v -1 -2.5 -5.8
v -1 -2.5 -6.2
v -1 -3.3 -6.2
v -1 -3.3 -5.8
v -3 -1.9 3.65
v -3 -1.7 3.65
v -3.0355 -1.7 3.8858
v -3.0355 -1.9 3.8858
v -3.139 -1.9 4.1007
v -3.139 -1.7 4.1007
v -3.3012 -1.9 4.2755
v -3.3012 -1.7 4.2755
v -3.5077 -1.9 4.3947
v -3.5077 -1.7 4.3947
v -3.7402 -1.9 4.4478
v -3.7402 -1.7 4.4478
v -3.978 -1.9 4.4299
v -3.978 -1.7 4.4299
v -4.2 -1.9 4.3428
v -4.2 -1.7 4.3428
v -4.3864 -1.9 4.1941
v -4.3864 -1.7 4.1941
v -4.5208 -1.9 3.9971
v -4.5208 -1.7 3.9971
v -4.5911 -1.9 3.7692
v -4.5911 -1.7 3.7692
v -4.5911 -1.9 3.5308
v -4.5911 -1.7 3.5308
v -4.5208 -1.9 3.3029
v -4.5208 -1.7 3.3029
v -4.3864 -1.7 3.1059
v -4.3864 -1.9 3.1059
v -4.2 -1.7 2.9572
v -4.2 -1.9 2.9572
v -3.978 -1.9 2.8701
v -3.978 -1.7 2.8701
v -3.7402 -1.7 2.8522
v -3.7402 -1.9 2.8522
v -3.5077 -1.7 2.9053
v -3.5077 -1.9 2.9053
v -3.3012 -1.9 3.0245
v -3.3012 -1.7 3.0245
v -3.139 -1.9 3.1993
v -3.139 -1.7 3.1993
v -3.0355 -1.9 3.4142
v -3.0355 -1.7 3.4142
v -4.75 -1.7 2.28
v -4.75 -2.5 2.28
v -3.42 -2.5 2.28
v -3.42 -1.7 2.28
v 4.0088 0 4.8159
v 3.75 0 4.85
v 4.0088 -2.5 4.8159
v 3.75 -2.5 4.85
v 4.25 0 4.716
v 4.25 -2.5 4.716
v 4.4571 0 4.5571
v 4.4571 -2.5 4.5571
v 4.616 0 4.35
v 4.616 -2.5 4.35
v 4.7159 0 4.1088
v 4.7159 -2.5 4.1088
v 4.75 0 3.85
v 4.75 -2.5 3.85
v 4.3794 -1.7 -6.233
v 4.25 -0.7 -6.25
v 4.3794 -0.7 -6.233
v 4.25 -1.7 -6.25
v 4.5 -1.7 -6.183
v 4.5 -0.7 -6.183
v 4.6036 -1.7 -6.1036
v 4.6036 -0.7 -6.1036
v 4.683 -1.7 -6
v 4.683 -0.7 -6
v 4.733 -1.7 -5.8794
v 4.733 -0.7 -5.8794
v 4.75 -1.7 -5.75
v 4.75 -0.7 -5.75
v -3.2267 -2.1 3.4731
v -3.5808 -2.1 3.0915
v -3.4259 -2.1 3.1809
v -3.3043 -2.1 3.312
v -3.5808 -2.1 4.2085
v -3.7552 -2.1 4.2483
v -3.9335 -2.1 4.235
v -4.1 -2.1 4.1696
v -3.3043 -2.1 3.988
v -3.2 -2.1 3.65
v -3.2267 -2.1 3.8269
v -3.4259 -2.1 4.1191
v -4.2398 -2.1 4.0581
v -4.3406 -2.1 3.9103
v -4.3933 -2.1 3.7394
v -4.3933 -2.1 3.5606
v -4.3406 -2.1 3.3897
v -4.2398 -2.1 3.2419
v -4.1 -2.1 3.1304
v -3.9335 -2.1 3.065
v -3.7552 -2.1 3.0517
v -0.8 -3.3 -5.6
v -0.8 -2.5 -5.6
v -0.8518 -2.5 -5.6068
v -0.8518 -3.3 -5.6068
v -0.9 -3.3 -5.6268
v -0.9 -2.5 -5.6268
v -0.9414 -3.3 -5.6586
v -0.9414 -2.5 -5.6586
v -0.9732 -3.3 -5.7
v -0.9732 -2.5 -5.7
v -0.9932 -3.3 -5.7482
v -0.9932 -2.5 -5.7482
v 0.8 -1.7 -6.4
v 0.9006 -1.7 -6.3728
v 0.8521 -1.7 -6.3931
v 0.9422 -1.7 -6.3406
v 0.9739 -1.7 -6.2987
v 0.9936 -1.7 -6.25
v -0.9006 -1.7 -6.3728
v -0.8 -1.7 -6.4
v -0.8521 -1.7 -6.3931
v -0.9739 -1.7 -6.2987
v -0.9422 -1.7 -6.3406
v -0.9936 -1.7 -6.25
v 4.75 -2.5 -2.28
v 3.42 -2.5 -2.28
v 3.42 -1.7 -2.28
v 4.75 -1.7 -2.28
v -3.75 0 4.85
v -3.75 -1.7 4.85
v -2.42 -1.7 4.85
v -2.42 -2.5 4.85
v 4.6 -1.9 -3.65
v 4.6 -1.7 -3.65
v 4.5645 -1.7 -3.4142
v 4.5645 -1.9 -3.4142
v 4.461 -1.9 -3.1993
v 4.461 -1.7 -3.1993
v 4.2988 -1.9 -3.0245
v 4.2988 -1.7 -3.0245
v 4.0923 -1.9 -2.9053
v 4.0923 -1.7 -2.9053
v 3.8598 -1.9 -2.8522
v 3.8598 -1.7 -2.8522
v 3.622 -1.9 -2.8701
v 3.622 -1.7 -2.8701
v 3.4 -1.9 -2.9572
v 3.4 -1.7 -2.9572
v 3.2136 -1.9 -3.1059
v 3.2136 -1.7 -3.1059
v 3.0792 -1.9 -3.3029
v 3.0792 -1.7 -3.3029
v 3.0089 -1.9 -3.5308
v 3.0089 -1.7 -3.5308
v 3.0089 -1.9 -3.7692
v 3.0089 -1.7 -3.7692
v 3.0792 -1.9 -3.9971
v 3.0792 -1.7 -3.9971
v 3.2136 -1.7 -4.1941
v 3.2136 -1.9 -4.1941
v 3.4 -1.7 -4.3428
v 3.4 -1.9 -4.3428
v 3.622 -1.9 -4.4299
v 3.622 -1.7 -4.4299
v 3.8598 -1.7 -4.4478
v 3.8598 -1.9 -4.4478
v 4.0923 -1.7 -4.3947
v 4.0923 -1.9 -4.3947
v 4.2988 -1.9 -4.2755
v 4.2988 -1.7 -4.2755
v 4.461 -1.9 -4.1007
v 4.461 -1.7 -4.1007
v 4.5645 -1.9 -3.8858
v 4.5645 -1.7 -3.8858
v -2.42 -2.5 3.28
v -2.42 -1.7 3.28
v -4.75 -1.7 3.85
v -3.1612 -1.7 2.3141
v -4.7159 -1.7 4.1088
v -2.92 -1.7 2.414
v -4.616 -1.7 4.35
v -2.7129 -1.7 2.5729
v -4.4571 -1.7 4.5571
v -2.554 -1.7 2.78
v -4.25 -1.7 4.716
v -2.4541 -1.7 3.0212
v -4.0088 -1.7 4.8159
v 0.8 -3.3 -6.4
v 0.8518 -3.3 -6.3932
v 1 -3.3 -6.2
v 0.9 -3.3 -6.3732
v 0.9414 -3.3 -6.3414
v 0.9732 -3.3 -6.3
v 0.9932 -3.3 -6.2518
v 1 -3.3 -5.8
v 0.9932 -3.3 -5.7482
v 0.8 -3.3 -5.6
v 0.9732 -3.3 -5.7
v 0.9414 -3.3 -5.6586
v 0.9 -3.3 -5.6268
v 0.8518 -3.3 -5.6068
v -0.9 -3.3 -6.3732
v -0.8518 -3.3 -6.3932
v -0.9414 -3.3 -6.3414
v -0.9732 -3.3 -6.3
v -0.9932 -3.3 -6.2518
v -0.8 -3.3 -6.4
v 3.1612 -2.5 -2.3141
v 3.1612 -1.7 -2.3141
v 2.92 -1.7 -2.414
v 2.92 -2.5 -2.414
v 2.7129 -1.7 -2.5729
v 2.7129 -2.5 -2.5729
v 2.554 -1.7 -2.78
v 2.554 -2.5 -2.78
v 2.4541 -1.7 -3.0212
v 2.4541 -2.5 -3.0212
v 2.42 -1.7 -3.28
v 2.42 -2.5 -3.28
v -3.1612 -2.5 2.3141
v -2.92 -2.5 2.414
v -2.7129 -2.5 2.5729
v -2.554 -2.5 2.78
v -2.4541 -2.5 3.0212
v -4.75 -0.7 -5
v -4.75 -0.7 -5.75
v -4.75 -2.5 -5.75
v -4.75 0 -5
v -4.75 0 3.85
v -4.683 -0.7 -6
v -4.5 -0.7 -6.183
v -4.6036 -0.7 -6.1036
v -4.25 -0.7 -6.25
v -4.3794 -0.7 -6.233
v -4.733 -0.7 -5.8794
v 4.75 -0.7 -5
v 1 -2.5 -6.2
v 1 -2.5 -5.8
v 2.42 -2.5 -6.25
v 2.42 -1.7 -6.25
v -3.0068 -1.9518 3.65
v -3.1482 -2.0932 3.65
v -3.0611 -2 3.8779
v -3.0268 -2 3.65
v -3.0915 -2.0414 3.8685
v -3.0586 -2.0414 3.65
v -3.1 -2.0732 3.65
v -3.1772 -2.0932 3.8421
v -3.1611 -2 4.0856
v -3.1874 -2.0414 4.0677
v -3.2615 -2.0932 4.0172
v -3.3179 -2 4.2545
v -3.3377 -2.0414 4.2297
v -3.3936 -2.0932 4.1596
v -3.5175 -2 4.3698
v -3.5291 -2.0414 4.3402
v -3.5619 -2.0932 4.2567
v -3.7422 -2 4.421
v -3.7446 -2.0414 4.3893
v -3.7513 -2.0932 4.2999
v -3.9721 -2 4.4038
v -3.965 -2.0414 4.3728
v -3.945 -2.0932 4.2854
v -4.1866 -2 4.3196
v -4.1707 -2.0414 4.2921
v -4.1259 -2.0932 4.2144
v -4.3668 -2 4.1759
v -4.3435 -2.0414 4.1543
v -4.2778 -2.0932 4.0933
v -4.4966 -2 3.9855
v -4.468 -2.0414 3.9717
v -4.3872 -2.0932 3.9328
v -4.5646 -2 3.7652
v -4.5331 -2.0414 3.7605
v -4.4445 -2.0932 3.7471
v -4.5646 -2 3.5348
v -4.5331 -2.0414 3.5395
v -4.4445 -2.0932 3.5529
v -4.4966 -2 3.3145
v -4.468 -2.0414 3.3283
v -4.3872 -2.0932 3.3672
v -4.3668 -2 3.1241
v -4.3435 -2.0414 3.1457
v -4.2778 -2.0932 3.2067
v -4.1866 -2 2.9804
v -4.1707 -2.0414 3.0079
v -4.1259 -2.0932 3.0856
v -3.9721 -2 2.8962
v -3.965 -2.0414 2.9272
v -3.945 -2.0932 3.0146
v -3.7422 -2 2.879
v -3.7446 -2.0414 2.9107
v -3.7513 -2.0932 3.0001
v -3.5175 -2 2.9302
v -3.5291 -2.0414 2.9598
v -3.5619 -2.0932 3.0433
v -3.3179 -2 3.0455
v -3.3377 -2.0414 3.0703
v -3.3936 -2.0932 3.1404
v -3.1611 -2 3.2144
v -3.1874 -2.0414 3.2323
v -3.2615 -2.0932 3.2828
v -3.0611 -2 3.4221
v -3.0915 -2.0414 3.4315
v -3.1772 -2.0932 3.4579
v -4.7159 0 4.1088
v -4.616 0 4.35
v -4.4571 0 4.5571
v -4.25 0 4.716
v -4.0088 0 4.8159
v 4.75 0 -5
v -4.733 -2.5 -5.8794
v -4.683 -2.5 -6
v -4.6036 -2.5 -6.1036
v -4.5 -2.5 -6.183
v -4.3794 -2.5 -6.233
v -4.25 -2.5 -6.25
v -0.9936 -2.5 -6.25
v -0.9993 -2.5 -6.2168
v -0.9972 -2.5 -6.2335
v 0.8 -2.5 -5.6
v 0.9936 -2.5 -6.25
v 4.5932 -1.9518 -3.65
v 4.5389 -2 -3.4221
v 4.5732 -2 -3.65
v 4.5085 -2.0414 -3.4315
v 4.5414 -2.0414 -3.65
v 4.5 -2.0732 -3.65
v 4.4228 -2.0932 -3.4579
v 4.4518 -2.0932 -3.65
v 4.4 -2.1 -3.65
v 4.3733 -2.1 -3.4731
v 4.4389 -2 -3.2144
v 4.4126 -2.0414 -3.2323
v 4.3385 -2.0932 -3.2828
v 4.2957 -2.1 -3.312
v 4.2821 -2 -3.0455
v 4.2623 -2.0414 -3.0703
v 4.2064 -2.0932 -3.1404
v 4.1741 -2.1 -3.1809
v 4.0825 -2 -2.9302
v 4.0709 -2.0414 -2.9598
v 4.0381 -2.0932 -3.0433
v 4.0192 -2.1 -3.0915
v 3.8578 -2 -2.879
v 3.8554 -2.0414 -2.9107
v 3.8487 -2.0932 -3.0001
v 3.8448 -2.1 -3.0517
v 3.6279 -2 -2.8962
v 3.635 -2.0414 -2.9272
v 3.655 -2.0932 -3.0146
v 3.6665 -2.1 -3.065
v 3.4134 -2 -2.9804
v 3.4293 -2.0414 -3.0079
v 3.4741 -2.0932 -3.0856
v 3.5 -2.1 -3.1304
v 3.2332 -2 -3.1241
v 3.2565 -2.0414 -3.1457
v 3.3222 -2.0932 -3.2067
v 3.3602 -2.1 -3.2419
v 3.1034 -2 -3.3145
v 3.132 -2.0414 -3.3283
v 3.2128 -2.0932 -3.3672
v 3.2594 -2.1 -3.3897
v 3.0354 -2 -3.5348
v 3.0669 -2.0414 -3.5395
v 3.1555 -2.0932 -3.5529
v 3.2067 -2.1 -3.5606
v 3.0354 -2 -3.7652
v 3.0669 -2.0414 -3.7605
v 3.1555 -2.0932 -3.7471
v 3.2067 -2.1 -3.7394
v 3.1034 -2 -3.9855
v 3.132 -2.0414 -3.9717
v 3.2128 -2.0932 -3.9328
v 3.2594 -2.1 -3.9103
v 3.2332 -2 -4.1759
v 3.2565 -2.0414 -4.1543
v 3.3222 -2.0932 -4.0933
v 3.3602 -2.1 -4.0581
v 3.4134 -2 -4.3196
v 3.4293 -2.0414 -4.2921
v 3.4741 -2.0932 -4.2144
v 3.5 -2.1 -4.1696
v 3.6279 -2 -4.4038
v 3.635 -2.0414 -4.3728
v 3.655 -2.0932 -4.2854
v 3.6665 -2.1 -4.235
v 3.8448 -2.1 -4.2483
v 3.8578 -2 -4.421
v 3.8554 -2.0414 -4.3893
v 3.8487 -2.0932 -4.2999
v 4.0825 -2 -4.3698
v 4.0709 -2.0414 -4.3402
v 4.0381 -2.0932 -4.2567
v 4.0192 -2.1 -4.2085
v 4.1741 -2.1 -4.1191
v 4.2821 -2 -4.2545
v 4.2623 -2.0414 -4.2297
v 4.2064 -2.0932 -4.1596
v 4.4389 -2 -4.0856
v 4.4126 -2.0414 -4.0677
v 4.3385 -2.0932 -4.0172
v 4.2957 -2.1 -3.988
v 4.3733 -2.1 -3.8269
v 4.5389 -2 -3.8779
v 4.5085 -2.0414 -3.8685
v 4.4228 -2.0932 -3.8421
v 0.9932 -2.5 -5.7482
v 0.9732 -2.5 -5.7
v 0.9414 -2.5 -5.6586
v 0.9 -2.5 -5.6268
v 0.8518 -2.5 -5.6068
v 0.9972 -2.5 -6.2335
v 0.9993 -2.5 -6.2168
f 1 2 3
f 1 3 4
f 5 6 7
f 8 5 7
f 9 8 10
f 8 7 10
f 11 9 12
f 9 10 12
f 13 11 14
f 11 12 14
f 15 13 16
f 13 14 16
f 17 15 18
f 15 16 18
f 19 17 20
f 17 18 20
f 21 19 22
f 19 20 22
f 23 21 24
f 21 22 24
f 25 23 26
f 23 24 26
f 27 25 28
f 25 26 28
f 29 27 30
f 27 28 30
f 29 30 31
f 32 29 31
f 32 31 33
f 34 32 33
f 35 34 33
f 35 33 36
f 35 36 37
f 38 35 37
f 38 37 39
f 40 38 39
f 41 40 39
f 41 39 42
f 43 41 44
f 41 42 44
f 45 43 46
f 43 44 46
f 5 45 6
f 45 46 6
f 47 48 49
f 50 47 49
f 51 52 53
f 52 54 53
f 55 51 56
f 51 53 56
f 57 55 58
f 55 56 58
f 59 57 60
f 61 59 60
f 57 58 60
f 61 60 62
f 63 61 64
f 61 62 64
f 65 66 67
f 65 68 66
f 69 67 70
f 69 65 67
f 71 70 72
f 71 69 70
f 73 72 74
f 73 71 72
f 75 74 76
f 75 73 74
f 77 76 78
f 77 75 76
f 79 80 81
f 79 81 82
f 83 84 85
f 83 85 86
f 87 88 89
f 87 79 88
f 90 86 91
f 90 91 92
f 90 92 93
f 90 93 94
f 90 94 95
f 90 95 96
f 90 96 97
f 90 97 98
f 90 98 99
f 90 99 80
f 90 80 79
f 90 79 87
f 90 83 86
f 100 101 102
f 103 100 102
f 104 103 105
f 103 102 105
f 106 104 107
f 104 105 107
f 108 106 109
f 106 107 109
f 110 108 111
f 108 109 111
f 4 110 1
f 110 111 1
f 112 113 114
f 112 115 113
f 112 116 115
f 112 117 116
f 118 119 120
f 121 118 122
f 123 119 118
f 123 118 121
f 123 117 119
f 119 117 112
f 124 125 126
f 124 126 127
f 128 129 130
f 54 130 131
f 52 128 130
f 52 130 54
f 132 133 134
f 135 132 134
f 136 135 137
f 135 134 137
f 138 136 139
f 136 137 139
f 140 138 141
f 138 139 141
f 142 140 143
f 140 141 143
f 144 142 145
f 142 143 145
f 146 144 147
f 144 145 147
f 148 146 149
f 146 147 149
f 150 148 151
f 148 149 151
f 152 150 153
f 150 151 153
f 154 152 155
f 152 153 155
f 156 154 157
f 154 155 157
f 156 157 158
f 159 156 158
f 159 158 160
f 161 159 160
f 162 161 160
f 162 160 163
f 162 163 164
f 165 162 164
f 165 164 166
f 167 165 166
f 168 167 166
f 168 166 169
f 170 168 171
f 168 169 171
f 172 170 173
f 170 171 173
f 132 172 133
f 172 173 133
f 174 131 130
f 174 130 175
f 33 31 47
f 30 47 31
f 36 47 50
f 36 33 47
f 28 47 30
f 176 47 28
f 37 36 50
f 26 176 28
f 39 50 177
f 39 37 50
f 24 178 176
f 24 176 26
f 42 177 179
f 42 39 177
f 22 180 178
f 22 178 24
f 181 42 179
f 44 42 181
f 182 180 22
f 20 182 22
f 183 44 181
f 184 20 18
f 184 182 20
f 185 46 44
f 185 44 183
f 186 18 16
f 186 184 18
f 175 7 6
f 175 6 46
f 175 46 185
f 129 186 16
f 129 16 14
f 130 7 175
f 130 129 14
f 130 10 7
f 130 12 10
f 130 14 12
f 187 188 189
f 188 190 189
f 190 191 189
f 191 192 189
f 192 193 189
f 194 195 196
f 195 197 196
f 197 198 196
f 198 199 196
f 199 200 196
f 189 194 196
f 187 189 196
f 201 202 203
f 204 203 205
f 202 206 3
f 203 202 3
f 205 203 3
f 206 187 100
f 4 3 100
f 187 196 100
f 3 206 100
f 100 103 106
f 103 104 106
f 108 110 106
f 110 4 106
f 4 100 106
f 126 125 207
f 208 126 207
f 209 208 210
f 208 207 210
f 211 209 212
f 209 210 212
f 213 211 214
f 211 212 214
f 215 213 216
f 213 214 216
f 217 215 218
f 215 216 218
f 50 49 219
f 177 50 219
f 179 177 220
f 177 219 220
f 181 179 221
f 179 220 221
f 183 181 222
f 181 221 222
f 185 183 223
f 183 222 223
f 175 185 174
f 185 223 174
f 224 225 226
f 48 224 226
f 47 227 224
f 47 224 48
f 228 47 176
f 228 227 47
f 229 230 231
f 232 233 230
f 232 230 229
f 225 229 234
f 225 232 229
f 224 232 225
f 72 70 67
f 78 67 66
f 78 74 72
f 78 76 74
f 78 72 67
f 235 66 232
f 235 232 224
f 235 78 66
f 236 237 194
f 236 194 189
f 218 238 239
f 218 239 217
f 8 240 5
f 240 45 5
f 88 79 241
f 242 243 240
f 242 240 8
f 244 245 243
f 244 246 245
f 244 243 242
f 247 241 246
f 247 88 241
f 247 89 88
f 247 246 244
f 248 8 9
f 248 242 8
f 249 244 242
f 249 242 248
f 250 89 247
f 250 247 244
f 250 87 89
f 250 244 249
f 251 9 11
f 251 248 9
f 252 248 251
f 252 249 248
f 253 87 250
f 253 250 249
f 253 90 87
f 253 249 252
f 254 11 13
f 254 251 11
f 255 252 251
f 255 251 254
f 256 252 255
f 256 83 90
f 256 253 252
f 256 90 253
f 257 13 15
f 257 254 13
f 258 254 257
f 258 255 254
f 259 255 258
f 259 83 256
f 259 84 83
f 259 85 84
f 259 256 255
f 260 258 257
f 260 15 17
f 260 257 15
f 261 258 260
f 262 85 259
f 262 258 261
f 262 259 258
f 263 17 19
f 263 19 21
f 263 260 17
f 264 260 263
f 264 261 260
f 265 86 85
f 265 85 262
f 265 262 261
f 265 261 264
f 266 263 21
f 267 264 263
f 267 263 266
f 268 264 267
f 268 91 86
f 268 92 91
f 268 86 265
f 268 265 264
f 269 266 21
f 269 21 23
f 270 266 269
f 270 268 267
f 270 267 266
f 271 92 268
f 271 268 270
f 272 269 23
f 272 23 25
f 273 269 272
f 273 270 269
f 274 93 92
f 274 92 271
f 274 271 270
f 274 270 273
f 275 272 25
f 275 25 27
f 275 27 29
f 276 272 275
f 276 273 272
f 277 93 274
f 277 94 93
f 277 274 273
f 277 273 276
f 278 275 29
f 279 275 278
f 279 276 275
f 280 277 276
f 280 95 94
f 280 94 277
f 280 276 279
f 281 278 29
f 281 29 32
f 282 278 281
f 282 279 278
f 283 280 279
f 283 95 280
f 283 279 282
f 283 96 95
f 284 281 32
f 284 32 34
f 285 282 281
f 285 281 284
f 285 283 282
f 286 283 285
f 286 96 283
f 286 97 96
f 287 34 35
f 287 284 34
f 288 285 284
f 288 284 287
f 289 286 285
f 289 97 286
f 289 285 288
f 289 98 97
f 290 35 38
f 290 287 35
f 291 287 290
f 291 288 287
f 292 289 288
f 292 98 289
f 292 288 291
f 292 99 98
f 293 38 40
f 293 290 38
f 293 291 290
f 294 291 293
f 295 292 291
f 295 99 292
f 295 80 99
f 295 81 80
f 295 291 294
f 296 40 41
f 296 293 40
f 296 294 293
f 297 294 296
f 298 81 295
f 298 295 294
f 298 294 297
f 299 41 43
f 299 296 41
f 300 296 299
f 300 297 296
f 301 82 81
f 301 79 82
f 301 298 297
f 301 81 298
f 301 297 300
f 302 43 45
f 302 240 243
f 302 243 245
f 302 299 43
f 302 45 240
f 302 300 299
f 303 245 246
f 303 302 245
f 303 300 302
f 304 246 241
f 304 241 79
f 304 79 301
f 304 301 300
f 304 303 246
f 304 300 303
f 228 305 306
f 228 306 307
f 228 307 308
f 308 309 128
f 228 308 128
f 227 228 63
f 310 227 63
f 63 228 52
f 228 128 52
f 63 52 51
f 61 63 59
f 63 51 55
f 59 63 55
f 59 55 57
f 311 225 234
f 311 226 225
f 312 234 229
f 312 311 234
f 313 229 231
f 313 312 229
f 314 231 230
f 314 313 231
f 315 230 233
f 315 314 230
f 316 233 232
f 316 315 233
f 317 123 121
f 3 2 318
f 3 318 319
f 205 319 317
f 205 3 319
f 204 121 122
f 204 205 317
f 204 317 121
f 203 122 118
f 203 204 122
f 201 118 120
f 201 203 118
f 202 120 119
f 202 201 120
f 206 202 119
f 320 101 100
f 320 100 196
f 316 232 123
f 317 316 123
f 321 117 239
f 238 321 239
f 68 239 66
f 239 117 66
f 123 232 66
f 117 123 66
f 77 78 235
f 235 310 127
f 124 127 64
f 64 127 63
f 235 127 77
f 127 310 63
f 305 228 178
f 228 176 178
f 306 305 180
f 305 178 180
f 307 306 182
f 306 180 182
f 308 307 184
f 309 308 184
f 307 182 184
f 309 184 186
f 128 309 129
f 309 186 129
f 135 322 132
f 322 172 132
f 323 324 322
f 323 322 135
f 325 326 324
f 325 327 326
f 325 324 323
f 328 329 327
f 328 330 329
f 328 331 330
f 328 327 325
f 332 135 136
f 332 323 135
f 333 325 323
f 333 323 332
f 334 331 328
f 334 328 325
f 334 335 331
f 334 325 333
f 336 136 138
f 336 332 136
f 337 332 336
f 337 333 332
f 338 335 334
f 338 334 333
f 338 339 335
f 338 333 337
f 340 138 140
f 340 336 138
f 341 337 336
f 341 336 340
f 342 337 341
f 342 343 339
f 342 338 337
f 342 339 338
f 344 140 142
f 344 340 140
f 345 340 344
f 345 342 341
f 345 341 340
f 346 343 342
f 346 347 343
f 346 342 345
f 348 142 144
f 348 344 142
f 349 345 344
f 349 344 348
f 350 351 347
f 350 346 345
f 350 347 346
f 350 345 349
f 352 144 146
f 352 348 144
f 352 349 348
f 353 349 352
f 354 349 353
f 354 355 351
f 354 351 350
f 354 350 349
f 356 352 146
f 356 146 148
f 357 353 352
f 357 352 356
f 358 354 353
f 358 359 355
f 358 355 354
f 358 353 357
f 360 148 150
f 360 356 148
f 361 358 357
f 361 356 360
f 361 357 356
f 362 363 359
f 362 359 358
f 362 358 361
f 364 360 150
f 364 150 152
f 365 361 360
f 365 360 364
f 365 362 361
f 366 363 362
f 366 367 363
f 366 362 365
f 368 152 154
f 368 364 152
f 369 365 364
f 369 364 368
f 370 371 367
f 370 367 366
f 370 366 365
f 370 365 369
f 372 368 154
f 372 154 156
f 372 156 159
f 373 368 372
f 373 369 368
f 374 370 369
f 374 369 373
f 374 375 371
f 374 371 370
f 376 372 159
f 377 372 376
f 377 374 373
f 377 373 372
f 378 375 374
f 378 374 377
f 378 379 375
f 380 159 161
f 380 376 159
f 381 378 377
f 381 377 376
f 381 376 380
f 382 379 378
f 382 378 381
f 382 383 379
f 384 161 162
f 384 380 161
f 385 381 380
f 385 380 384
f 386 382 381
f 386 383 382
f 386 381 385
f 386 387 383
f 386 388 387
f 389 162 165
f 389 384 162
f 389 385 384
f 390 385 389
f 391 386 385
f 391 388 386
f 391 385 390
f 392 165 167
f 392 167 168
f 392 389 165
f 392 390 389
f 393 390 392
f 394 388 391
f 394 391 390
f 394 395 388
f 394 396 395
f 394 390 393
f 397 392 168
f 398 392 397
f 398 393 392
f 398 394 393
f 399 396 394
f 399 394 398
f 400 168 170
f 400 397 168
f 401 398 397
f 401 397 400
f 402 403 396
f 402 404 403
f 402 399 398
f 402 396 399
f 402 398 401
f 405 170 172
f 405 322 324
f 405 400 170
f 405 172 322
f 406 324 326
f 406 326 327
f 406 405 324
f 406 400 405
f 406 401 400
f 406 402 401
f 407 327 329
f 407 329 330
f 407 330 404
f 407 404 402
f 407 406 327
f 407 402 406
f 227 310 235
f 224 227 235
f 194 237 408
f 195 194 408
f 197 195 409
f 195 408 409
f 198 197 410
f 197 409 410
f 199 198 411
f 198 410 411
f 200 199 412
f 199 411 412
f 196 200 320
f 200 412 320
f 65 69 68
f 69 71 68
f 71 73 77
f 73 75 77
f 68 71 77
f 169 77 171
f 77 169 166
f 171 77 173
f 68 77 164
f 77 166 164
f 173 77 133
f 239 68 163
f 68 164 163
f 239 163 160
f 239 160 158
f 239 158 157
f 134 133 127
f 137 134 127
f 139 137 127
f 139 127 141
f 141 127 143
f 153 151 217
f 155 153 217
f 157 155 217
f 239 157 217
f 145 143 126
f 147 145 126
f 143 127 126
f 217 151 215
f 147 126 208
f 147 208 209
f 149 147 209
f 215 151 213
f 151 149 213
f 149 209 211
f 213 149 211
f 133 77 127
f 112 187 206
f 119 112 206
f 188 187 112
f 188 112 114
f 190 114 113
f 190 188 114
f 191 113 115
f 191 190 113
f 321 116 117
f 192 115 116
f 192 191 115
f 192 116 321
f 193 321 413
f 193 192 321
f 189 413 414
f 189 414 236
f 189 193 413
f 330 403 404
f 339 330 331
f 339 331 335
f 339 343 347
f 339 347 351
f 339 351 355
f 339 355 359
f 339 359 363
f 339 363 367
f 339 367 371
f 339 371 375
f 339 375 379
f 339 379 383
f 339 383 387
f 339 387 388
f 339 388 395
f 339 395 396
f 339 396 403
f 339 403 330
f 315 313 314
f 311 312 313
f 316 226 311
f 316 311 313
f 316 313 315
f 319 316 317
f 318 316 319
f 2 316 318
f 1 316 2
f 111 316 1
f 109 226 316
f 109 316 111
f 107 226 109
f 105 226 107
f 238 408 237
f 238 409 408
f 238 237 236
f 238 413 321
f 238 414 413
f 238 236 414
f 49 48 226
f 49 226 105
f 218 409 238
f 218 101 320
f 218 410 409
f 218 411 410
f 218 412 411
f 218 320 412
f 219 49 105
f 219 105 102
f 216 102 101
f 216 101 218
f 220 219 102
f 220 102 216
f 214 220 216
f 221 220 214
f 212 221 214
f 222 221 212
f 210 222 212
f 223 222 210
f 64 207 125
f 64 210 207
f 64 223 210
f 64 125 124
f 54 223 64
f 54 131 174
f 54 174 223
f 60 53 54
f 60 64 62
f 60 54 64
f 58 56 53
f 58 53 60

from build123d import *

# Parameters (mm, degrees)
SKETCH_W          = 9.5
SKETCH_H          = 11.1
PAD_DEPTH         = 2.5
POCKET_DEPTH      = 0.8
SKETCH002_R       = 0.8
PAD001_DEPTH      = 0.4
SKETCH003_R       = 0.8
PAD002_DEPTH      = 0.4
FILLET_R          = 0.2
SKETCH004_W       = 1.25
SKETCH004_H       = 0.7
POCKET001_DEPTH   = 9.5
FILLET001_R       = 1
FILLET002_R       = 0.5
PAD003_DEPTH      = 0.8
PAD003_DEPTH_BACK = 0.8


with BuildPart() as part:
    # Sketch → Pad (new body)
    with BuildSketch(Plane.XZ):
        with Locations((0, -0.7)):
            Rectangle(SKETCH_W, SKETCH_H)
    extrude(amount=PAD_DEPTH)

    # Sketch001 (on Face6 of Pad) → Pocket (cut)
    with BuildSketch(Plane.XZ.offset(2.5)):
        with BuildLine():
            Line((3.42, -2.28), (4.75, -2.28))
            Line((4.75, -2.28), (4.75, -6.25))
            Line((4.75, -6.25), (2.42, -6.25))
            Line((2.42, -6.25), (2.42, -3.28))
            ThreePointArc((3.42, -2.28), (2.712893, -2.572893), (2.42, -3.28))
        make_face()
        with BuildLine():
            Line((-4.75, 4.85), (-4.75, 2.28))
            Line((-4.75, 2.28), (-3.42, 2.28))
            ThreePointArc((-3.42, 2.28), (-2.712893, 2.572893), (-2.42, 3.28))
            Line((-2.42, 4.85), (-2.42, 3.28))
            Line((-4.75, 4.85), (-2.42, 4.85))
        make_face()
    extrude(amount=-POCKET_DEPTH, mode=Mode.SUBTRACT)

    # Sketch002 (on Face9 of Pocket) → Pad001 (join)
    with BuildSketch(Plane.XZ.offset(1.7)):
        with Locations((3.8, -3.65)):
            Circle(SKETCH002_R)
    extrude(amount=PAD001_DEPTH)

    # Sketch003 (on Face6 of Pad001) → Pad002 (join)
    with BuildSketch(Plane.XZ.offset(1.7)):
        with Locations((-3.8, 3.65)):
            Circle(SKETCH003_R)
    extrude(amount=PAD002_DEPTH)

    # Fillet
    fillet_edges = [part.edges().sort_by_distance(p)[0] for p in [
        (-4.6, -2.1, 3.65),
        (3, -2.1, -3.65),
    ]]
    fillet(fillet_edges, radius=FILLET_R)

    # Sketch004 (on Face13 of Fillet) → Pocket001 (cut)
    with BuildSketch(Plane(origin=(4.75, 0, 0), x_dir=(0, 0, 1), z_dir=(1, 0, 0))):
        with Locations((-5.625, 0.35)):
            Rectangle(SKETCH004_W, SKETCH004_H)
    extrude(amount=-POCKET001_DEPTH, mode=Mode.SUBTRACT)

    # Fillet001
    fillet001_edges = [part.edges().sort_by_distance(p)[0] for p in [
        (4.75, -1.25, 4.85),
        (-4.75, -0.85, 4.85),
    ]]
    fillet(fillet001_edges, radius=FILLET001_R)

    # Fillet002
    fillet002_edges = [part.edges().sort_by_distance(p)[0] for p in [
        (-4.75, -1.6, -6.25),
        (4.75, -1.2, -6.25),
    ]]
    fillet(fillet002_edges, radius=FILLET002_R)

    # Sketch005 (on Face5 of Fillet002) → Pad003 (join, two sides)
    with BuildSketch(Plane.XZ.offset(2.5)) as pad003_sk:
        with BuildLine():
            Line((-0.8, -5.6), (0.8, -5.6))
            ThreePointArc((1, -5.8), (0.941421, -5.658579), (0.8, -5.6))
            Line((1, -5.8), (1, -6.2))
            ThreePointArc((0.8, -6.4), (0.941421, -6.341421), (1, -6.2))
            Line((0.8, -6.4), (-0.8, -6.4))
            ThreePointArc((-1, -6.2), (-0.941421, -6.341421), (-0.8, -6.4))
            Line((-1, -6.2), (-1, -5.8))
            ThreePointArc((-0.8, -5.6), (-0.941421, -5.658579), (-1, -5.8))
        make_face()
    extrude(amount=PAD003_DEPTH)
    extrude(pad003_sk.sketch, amount=-PAD003_DEPTH_BACK)


solid = part.part
